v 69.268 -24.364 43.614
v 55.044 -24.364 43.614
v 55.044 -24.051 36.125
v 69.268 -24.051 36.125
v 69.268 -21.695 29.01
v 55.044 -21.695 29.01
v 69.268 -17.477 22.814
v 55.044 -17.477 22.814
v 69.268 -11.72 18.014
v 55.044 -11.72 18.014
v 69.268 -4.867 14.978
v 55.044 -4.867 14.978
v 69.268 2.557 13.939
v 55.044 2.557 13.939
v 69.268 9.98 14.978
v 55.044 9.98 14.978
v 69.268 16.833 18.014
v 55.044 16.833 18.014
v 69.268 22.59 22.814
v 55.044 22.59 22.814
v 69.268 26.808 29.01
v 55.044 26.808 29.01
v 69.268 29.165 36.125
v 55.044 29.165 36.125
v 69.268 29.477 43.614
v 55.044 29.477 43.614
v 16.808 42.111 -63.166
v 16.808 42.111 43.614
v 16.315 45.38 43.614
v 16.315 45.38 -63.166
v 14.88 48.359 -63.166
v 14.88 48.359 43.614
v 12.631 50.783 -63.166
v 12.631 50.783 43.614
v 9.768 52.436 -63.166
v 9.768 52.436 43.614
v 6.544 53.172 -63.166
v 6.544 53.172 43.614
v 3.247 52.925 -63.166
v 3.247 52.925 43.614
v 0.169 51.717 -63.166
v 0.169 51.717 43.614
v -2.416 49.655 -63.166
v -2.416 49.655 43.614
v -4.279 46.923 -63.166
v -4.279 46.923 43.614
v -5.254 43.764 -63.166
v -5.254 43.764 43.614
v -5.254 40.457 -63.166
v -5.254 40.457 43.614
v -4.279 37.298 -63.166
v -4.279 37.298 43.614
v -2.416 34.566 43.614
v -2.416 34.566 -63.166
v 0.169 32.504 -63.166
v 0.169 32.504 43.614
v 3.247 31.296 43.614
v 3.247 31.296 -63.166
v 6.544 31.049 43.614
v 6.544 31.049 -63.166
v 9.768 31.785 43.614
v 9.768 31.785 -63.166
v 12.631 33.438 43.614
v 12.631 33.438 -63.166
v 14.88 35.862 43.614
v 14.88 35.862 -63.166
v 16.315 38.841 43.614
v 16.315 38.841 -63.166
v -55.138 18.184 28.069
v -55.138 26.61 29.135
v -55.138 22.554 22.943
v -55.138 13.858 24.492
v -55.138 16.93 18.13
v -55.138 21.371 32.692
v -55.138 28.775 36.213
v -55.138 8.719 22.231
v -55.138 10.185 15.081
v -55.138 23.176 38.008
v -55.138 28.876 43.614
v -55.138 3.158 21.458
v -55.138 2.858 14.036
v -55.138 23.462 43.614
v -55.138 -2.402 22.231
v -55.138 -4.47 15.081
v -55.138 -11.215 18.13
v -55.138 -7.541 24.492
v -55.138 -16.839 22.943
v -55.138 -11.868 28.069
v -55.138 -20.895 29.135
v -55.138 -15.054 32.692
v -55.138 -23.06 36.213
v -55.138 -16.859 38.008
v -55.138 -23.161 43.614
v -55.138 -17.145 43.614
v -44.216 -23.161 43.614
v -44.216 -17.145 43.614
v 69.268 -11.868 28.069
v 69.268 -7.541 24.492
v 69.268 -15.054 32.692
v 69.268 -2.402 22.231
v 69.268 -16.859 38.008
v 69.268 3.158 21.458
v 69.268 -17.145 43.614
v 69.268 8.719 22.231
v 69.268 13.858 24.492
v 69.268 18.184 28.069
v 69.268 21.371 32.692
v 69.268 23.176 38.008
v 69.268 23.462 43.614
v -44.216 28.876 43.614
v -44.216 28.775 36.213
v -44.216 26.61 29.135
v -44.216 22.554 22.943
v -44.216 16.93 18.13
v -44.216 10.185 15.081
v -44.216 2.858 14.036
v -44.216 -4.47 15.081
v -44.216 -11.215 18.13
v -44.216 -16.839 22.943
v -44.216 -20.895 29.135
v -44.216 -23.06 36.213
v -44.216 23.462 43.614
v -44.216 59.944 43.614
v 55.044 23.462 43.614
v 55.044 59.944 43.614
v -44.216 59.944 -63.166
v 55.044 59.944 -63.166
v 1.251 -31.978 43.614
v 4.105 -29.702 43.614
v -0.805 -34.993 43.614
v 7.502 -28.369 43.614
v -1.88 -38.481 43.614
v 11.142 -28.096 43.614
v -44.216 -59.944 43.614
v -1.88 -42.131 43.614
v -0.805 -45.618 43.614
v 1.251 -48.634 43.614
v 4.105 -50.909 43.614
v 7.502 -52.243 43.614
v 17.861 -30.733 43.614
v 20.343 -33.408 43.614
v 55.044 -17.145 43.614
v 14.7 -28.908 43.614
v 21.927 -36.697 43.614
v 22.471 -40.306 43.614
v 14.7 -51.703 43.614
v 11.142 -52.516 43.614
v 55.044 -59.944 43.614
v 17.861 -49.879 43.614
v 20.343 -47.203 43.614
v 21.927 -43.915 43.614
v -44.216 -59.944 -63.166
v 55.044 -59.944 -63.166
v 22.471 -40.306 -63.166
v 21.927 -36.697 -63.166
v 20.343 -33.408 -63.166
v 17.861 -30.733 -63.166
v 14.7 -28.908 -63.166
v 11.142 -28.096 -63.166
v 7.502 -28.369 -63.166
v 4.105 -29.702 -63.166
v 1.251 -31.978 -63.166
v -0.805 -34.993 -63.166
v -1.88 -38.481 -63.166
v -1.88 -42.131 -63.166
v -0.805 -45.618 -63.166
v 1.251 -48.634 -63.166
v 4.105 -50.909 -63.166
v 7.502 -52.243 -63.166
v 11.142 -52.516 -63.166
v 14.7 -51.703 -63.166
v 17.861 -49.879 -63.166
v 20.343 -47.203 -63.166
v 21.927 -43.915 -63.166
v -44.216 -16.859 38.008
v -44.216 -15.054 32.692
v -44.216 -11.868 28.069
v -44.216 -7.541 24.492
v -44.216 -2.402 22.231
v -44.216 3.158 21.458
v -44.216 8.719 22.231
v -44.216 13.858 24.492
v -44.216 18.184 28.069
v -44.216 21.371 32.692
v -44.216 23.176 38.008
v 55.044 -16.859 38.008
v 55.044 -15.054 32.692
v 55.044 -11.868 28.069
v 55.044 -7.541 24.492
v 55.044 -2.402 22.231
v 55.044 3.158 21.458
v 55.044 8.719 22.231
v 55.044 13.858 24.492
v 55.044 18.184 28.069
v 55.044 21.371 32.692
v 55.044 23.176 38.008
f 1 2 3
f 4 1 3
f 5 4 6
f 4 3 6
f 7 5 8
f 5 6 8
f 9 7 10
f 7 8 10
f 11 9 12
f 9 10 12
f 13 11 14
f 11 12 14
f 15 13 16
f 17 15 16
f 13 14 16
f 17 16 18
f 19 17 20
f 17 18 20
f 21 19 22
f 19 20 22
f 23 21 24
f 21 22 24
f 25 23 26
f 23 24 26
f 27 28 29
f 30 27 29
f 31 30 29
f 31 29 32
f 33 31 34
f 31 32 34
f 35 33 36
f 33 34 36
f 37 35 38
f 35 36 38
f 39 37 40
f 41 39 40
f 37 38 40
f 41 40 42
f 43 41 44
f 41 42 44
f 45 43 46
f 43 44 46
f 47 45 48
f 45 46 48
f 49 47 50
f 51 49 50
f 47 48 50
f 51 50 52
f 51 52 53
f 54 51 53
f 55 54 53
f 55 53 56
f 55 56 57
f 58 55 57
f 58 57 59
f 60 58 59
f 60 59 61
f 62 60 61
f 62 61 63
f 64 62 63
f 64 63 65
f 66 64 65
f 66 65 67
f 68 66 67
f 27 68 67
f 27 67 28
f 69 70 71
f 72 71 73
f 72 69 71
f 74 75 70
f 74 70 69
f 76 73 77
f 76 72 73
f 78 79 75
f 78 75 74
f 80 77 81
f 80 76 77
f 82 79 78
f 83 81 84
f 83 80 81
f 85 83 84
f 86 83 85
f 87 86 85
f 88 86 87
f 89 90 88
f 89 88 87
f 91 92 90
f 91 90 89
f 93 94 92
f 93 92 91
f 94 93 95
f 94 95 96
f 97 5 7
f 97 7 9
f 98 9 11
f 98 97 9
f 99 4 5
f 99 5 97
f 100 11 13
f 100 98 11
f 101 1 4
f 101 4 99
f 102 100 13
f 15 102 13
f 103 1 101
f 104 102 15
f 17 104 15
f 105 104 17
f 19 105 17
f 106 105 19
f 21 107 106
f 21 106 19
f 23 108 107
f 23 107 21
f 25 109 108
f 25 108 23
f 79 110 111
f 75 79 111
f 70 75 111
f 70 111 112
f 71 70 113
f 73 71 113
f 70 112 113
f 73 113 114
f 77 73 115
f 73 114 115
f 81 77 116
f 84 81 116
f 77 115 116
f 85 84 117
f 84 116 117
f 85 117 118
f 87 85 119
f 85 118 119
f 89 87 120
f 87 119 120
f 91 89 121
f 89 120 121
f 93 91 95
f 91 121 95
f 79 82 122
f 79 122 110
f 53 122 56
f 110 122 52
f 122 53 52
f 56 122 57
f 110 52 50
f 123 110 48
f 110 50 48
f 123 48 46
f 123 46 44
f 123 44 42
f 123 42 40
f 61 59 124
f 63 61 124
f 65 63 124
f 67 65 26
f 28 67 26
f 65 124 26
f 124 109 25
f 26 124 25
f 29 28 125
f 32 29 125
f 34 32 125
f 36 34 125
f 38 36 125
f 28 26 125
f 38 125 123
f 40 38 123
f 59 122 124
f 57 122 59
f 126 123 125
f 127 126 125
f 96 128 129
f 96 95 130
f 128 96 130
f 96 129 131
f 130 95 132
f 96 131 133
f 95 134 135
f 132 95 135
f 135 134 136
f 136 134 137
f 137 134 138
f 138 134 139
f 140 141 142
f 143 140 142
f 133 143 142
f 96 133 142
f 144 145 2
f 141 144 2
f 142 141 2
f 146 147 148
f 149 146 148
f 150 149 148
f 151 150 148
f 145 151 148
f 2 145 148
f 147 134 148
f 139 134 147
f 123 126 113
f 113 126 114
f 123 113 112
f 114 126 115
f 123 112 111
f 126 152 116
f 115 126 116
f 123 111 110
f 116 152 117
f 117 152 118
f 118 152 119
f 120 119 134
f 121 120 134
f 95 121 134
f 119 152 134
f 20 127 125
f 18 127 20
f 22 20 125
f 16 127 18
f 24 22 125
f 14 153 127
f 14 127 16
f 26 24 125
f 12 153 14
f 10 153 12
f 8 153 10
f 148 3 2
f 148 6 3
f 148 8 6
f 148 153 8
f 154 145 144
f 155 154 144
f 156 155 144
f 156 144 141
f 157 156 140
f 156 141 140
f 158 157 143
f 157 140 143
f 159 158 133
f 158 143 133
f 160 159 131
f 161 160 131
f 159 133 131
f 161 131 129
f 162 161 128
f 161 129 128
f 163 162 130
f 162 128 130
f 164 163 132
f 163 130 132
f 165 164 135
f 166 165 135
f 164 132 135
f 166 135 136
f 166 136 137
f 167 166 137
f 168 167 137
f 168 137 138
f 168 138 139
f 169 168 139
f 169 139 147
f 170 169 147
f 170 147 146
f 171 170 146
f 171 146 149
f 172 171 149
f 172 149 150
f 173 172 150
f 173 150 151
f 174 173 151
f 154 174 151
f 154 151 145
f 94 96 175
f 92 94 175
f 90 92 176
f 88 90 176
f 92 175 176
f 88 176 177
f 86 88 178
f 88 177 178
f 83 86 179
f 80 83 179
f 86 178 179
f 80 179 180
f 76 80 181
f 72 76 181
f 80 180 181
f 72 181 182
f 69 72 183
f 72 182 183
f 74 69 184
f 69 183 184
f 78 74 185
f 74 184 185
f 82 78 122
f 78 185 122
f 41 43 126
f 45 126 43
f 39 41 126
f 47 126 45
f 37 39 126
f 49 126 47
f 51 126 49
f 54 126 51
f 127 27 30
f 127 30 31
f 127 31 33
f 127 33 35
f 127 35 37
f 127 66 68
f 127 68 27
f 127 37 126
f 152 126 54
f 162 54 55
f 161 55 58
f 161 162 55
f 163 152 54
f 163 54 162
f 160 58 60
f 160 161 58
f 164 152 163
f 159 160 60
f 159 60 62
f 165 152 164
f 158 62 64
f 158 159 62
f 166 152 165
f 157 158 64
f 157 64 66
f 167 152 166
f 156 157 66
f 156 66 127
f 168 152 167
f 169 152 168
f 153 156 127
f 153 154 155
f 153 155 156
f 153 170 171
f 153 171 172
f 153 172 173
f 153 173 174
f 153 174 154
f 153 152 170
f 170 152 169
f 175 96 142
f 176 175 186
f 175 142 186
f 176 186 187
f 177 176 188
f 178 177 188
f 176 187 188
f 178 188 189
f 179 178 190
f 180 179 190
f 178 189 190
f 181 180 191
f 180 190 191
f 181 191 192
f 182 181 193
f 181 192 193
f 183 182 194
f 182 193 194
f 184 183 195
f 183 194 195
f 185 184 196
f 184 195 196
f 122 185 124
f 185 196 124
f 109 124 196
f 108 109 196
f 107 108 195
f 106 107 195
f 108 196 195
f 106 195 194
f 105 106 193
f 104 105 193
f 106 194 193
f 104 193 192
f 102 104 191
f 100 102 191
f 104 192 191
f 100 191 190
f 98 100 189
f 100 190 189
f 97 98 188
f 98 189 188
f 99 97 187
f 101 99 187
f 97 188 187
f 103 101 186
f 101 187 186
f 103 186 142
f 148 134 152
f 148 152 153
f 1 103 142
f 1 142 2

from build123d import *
from build123d import SkipClean  # not in build123d's __all__

# Parameters (mm, degrees)
F0_W     = 99.2605239153
F0_H     = 106.7802645266
F1_DEPTH = 59.944
F3_DEPTH = 99.2615239153
F5_DEPTH = 14.224
F7_DEPTH = 10.922
F8_R     = 11.0925650774
F8_R_2   = 12.2440148534
F9_DEPTH = 106.7812645266


# Not quite as in the source:
# - after a boolean that leaves OpenCascade's solid faulty, fix() repairs it


with BuildPart() as f1:
    # F0 (on Front) → F1 (new body, symmetric)
    with BuildSketch(Plane.XZ):
        with Locations((5.4142102599, -9.7756590694)):
            Rectangle(F0_W, F0_H)
    extrude(amount=F1_DEPTH, both=True)

    # F2 (on face) → F3 (cut, through all)
    with BuildSketch(Plane.YZ.offset(55.0444722176)):
        with BuildLine():
            Line((23.4615784138, 43.6144731939), (-17.1450003982, 43.6144731939))
            ThreePointArc((-17.1450003982, 43.6144731939), (3.1582890078, 21.4579654327), (23.4615784138, 43.6144731939))
        make_face()
    extrude(amount=-F3_DEPTH, mode=Mode.SUBTRACT)

    # F4 (on face) → F5 (join)
    with BuildSketch(Plane.YZ.offset(55.0444722176)):
        with BuildLine():
            Line((-17.1450003982, 43.6144731939), (-24.3639480323, 43.6144731939))
            ThreePointArc((-24.3639480323, 43.6144731939), (2.5567095727, 13.9394518293), (29.4773671776, 43.6144731939))
            Line((29.4773671776, 43.6144731939), (23.4615784138, 43.6144731939))
            ThreePointArc((23.4615784138, 43.6144731939), (3.1582890078, 21.4579654327), (-17.1450003982, 43.6144731939))
        make_face()
    with SkipClean():  # cleaning this boolean's faces spoils the solid; the shape is the same uncleaned
        extrude(amount=F5_DEPTH)

    # F6 (on face) → F7 (join)
    with BuildSketch(Plane(origin=(-44.2160516977, 0, 0), x_dir=(0, -1, 0), z_dir=(-1, 0, 0))):
        with BuildLine():
            Line((-23.4615784138, 43.6144731939), (-28.8757905364, 43.6144731939))
            ThreePointArc((-28.8757905364, 43.6144731939), (-2.8575006872, 14.036395677), (23.1607891619, 43.6144731939))
            Line((23.1607891619, 43.6144731939), (17.1450003982, 43.6144731939))
            ThreePointArc((17.1450003982, 43.6144731939), (-3.1582890078, 21.4579654327), (-23.4615784138, 43.6144731939))
        make_face()
    extrude(amount=F7_DEPTH)

    add(f1.part.fix(), mode=Mode.REPLACE)

    # F8 (on face) → F9 (cut, through all)
    with BuildSketch(Plane.XY.offset(43.6144731939)):
        with Locations((5.7150018401, 42.1105287969)):
            Circle(F8_R)
        with Locations((10.2268429473, -40.3057895601)):
            Circle(F8_R_2)
    extrude(amount=-F9_DEPTH, mode=Mode.SUBTRACT)


solid = f1.part
